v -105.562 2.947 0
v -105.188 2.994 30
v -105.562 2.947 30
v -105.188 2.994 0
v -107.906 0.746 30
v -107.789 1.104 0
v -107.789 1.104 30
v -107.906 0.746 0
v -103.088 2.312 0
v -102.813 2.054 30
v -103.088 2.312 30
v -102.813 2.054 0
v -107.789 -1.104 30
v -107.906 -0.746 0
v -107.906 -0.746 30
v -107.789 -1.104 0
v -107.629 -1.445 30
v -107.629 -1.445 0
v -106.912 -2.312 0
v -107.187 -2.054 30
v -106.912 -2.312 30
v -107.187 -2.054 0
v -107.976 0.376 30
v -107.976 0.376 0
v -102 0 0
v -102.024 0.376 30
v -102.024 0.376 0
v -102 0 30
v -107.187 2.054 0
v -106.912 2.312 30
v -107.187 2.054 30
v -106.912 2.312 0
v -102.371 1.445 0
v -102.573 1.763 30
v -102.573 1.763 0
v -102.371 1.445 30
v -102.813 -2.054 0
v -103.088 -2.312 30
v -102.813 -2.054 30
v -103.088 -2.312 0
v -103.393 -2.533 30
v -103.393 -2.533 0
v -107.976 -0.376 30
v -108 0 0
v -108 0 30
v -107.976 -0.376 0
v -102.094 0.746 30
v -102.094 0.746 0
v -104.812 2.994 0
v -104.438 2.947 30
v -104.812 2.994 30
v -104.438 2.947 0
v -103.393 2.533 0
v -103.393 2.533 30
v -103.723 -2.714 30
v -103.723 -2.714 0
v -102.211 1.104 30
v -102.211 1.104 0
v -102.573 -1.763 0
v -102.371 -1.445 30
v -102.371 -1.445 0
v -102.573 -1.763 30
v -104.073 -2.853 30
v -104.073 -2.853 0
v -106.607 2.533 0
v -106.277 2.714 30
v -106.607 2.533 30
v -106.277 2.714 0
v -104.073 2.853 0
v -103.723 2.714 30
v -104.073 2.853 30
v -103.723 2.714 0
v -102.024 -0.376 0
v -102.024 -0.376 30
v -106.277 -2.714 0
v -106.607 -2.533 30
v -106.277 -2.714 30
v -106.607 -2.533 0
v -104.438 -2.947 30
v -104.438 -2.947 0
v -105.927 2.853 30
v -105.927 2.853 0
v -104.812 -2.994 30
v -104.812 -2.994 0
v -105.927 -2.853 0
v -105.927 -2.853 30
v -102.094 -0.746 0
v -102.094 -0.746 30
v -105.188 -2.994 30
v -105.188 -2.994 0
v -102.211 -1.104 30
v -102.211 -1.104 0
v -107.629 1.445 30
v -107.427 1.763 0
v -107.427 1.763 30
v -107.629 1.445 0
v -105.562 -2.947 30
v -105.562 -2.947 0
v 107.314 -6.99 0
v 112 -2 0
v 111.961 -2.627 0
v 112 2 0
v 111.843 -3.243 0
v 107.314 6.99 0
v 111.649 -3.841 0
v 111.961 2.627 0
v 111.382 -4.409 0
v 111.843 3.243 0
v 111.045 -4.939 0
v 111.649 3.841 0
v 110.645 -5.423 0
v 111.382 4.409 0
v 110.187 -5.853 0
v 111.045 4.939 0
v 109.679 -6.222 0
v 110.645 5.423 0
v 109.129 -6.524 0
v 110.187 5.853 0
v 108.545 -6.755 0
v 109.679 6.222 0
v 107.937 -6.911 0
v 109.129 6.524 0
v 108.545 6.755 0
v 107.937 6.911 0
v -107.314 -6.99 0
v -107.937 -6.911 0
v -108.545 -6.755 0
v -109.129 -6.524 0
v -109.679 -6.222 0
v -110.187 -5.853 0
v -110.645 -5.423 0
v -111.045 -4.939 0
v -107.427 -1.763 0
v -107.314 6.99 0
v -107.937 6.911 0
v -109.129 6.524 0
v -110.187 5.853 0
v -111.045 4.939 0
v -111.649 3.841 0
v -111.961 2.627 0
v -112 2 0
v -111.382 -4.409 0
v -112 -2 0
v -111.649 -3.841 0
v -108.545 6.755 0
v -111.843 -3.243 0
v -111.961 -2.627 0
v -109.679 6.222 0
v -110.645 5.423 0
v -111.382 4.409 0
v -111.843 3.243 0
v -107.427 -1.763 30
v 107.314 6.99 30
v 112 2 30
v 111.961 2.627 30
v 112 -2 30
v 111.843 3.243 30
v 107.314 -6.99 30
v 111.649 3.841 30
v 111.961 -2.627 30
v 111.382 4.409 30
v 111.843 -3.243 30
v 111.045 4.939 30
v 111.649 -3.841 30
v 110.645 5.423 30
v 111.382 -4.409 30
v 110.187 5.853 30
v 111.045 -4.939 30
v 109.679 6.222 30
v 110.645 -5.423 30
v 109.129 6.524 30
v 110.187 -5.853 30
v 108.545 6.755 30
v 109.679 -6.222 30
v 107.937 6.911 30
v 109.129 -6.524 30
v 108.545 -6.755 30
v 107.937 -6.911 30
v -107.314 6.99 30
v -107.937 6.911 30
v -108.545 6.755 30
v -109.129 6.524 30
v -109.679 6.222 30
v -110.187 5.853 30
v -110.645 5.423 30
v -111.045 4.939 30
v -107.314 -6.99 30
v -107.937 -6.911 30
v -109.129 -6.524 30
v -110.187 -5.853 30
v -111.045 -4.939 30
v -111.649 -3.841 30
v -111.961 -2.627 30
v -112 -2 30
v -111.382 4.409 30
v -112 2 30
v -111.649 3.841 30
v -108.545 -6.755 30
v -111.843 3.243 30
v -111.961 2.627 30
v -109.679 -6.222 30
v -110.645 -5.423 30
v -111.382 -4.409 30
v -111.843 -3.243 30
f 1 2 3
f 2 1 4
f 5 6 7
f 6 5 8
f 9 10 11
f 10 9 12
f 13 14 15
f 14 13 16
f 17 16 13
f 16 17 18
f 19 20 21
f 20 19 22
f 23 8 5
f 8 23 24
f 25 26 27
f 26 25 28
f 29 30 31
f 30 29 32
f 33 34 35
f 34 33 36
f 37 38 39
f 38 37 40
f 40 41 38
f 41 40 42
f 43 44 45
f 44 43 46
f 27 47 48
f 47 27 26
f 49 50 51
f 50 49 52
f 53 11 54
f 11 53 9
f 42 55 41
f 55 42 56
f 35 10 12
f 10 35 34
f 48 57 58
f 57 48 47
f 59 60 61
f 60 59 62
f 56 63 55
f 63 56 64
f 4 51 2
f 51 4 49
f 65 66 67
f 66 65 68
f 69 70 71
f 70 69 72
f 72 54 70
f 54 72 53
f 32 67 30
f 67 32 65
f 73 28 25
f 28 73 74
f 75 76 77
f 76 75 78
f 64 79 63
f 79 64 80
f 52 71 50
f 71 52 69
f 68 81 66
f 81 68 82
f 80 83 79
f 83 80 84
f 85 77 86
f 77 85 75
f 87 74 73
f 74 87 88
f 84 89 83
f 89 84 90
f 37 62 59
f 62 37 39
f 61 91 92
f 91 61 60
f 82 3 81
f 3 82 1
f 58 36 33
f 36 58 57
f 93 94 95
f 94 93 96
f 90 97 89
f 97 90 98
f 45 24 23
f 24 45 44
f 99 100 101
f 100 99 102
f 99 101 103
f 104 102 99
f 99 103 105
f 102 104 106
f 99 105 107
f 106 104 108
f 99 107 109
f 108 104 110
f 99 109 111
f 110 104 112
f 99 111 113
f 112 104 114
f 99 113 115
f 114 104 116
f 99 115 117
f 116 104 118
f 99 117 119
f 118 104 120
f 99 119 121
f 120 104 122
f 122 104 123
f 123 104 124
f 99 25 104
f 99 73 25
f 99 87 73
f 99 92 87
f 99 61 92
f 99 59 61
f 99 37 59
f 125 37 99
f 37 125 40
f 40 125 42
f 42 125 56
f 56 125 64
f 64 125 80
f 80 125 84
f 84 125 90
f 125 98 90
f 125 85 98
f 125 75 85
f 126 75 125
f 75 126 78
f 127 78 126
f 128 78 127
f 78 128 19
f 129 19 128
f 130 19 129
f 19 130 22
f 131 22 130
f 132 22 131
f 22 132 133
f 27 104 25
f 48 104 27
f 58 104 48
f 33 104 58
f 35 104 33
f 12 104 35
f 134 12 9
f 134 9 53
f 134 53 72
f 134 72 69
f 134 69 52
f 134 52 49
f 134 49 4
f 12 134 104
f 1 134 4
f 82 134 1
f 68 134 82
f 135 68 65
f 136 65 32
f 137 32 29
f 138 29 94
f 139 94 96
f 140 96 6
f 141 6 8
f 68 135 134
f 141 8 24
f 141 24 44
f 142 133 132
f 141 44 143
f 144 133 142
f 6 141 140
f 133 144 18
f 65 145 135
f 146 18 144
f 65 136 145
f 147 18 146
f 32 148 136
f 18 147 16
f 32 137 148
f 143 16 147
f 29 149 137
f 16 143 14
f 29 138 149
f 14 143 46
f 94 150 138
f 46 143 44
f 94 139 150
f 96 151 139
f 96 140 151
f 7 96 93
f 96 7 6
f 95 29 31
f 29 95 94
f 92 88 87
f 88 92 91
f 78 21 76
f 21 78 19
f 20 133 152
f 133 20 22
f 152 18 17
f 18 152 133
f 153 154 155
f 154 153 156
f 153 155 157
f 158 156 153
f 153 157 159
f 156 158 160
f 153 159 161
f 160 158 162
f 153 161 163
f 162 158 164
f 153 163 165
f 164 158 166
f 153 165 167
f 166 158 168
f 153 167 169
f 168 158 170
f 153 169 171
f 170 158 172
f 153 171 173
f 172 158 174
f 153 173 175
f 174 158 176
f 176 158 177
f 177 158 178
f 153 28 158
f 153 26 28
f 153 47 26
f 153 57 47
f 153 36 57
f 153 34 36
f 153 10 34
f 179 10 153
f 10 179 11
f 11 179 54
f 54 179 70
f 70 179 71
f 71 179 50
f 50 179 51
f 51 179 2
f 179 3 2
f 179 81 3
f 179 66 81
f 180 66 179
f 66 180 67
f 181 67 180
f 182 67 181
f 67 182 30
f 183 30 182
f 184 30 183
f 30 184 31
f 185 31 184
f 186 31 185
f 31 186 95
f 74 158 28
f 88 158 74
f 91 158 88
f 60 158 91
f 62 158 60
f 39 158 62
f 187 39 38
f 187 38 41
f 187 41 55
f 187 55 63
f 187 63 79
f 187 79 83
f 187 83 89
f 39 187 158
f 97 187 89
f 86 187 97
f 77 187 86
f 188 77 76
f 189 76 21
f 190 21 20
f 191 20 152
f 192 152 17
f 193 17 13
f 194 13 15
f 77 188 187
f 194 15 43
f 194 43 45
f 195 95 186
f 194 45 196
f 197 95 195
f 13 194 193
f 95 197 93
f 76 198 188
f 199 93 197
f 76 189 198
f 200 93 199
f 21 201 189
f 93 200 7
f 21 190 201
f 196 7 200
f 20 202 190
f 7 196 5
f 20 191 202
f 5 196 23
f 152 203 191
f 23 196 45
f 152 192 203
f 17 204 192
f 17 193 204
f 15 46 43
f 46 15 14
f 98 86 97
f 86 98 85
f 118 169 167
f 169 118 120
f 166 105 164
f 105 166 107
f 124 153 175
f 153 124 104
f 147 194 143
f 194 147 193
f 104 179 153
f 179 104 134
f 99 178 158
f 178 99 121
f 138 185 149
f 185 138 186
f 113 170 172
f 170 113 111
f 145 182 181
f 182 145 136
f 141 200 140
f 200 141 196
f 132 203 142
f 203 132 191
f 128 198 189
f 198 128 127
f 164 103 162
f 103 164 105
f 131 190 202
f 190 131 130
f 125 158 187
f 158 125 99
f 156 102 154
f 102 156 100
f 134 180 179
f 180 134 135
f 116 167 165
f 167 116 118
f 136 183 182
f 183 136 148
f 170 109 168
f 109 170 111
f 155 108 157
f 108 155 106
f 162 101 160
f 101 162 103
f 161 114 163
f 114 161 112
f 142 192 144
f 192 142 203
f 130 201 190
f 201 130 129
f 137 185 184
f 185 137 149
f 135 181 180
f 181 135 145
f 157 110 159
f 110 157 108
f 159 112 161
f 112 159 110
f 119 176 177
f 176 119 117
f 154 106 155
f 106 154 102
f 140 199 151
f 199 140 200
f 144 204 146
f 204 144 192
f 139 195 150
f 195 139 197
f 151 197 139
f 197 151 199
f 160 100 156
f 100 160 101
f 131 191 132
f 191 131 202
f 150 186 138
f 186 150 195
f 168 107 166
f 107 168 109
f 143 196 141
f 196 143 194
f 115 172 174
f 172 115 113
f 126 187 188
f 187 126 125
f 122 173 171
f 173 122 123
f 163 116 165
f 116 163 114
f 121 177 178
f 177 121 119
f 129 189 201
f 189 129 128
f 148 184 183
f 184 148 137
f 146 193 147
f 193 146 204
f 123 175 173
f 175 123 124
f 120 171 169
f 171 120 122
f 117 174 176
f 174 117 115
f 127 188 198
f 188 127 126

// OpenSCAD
$fn = 50;


difference() {
	union() {
		hull() {
			translate(v = [-107.0000000000, 2.0000000000, 0]) {
				cylinder(h = 30, r = 5);
			}
			translate(v = [107.0000000000, 2.0000000000, 0]) {
				cylinder(h = 30, r = 5);
			}
			translate(v = [-107.0000000000, -2.0000000000, 0]) {
				cylinder(h = 30, r = 5);
			}
			translate(v = [107.0000000000, -2.0000000000, 0]) {
				cylinder(h = 30, r = 5);
			}
		}
	}
	union() {
		translate(v = [-105.0000000000, 0.0000000000, 0]) {
			cylinder(h = 30, r = 3.0000000000);
		}
		translate(v = [-105.0000000000, 0.0000000000, 0]) {
			cylinder(h = 30, r = 1.5000000000);
		}
		translate(v = [-105.0000000000, 0.0000000000, 0]) {
			cylinder(h = 30, r = 1.5000000000);
		}
		translate(v = [-105.0000000000, 0.0000000000, 0]) {
			cylinder(h = 30, r = 1.5000000000);
		}
	}
}
